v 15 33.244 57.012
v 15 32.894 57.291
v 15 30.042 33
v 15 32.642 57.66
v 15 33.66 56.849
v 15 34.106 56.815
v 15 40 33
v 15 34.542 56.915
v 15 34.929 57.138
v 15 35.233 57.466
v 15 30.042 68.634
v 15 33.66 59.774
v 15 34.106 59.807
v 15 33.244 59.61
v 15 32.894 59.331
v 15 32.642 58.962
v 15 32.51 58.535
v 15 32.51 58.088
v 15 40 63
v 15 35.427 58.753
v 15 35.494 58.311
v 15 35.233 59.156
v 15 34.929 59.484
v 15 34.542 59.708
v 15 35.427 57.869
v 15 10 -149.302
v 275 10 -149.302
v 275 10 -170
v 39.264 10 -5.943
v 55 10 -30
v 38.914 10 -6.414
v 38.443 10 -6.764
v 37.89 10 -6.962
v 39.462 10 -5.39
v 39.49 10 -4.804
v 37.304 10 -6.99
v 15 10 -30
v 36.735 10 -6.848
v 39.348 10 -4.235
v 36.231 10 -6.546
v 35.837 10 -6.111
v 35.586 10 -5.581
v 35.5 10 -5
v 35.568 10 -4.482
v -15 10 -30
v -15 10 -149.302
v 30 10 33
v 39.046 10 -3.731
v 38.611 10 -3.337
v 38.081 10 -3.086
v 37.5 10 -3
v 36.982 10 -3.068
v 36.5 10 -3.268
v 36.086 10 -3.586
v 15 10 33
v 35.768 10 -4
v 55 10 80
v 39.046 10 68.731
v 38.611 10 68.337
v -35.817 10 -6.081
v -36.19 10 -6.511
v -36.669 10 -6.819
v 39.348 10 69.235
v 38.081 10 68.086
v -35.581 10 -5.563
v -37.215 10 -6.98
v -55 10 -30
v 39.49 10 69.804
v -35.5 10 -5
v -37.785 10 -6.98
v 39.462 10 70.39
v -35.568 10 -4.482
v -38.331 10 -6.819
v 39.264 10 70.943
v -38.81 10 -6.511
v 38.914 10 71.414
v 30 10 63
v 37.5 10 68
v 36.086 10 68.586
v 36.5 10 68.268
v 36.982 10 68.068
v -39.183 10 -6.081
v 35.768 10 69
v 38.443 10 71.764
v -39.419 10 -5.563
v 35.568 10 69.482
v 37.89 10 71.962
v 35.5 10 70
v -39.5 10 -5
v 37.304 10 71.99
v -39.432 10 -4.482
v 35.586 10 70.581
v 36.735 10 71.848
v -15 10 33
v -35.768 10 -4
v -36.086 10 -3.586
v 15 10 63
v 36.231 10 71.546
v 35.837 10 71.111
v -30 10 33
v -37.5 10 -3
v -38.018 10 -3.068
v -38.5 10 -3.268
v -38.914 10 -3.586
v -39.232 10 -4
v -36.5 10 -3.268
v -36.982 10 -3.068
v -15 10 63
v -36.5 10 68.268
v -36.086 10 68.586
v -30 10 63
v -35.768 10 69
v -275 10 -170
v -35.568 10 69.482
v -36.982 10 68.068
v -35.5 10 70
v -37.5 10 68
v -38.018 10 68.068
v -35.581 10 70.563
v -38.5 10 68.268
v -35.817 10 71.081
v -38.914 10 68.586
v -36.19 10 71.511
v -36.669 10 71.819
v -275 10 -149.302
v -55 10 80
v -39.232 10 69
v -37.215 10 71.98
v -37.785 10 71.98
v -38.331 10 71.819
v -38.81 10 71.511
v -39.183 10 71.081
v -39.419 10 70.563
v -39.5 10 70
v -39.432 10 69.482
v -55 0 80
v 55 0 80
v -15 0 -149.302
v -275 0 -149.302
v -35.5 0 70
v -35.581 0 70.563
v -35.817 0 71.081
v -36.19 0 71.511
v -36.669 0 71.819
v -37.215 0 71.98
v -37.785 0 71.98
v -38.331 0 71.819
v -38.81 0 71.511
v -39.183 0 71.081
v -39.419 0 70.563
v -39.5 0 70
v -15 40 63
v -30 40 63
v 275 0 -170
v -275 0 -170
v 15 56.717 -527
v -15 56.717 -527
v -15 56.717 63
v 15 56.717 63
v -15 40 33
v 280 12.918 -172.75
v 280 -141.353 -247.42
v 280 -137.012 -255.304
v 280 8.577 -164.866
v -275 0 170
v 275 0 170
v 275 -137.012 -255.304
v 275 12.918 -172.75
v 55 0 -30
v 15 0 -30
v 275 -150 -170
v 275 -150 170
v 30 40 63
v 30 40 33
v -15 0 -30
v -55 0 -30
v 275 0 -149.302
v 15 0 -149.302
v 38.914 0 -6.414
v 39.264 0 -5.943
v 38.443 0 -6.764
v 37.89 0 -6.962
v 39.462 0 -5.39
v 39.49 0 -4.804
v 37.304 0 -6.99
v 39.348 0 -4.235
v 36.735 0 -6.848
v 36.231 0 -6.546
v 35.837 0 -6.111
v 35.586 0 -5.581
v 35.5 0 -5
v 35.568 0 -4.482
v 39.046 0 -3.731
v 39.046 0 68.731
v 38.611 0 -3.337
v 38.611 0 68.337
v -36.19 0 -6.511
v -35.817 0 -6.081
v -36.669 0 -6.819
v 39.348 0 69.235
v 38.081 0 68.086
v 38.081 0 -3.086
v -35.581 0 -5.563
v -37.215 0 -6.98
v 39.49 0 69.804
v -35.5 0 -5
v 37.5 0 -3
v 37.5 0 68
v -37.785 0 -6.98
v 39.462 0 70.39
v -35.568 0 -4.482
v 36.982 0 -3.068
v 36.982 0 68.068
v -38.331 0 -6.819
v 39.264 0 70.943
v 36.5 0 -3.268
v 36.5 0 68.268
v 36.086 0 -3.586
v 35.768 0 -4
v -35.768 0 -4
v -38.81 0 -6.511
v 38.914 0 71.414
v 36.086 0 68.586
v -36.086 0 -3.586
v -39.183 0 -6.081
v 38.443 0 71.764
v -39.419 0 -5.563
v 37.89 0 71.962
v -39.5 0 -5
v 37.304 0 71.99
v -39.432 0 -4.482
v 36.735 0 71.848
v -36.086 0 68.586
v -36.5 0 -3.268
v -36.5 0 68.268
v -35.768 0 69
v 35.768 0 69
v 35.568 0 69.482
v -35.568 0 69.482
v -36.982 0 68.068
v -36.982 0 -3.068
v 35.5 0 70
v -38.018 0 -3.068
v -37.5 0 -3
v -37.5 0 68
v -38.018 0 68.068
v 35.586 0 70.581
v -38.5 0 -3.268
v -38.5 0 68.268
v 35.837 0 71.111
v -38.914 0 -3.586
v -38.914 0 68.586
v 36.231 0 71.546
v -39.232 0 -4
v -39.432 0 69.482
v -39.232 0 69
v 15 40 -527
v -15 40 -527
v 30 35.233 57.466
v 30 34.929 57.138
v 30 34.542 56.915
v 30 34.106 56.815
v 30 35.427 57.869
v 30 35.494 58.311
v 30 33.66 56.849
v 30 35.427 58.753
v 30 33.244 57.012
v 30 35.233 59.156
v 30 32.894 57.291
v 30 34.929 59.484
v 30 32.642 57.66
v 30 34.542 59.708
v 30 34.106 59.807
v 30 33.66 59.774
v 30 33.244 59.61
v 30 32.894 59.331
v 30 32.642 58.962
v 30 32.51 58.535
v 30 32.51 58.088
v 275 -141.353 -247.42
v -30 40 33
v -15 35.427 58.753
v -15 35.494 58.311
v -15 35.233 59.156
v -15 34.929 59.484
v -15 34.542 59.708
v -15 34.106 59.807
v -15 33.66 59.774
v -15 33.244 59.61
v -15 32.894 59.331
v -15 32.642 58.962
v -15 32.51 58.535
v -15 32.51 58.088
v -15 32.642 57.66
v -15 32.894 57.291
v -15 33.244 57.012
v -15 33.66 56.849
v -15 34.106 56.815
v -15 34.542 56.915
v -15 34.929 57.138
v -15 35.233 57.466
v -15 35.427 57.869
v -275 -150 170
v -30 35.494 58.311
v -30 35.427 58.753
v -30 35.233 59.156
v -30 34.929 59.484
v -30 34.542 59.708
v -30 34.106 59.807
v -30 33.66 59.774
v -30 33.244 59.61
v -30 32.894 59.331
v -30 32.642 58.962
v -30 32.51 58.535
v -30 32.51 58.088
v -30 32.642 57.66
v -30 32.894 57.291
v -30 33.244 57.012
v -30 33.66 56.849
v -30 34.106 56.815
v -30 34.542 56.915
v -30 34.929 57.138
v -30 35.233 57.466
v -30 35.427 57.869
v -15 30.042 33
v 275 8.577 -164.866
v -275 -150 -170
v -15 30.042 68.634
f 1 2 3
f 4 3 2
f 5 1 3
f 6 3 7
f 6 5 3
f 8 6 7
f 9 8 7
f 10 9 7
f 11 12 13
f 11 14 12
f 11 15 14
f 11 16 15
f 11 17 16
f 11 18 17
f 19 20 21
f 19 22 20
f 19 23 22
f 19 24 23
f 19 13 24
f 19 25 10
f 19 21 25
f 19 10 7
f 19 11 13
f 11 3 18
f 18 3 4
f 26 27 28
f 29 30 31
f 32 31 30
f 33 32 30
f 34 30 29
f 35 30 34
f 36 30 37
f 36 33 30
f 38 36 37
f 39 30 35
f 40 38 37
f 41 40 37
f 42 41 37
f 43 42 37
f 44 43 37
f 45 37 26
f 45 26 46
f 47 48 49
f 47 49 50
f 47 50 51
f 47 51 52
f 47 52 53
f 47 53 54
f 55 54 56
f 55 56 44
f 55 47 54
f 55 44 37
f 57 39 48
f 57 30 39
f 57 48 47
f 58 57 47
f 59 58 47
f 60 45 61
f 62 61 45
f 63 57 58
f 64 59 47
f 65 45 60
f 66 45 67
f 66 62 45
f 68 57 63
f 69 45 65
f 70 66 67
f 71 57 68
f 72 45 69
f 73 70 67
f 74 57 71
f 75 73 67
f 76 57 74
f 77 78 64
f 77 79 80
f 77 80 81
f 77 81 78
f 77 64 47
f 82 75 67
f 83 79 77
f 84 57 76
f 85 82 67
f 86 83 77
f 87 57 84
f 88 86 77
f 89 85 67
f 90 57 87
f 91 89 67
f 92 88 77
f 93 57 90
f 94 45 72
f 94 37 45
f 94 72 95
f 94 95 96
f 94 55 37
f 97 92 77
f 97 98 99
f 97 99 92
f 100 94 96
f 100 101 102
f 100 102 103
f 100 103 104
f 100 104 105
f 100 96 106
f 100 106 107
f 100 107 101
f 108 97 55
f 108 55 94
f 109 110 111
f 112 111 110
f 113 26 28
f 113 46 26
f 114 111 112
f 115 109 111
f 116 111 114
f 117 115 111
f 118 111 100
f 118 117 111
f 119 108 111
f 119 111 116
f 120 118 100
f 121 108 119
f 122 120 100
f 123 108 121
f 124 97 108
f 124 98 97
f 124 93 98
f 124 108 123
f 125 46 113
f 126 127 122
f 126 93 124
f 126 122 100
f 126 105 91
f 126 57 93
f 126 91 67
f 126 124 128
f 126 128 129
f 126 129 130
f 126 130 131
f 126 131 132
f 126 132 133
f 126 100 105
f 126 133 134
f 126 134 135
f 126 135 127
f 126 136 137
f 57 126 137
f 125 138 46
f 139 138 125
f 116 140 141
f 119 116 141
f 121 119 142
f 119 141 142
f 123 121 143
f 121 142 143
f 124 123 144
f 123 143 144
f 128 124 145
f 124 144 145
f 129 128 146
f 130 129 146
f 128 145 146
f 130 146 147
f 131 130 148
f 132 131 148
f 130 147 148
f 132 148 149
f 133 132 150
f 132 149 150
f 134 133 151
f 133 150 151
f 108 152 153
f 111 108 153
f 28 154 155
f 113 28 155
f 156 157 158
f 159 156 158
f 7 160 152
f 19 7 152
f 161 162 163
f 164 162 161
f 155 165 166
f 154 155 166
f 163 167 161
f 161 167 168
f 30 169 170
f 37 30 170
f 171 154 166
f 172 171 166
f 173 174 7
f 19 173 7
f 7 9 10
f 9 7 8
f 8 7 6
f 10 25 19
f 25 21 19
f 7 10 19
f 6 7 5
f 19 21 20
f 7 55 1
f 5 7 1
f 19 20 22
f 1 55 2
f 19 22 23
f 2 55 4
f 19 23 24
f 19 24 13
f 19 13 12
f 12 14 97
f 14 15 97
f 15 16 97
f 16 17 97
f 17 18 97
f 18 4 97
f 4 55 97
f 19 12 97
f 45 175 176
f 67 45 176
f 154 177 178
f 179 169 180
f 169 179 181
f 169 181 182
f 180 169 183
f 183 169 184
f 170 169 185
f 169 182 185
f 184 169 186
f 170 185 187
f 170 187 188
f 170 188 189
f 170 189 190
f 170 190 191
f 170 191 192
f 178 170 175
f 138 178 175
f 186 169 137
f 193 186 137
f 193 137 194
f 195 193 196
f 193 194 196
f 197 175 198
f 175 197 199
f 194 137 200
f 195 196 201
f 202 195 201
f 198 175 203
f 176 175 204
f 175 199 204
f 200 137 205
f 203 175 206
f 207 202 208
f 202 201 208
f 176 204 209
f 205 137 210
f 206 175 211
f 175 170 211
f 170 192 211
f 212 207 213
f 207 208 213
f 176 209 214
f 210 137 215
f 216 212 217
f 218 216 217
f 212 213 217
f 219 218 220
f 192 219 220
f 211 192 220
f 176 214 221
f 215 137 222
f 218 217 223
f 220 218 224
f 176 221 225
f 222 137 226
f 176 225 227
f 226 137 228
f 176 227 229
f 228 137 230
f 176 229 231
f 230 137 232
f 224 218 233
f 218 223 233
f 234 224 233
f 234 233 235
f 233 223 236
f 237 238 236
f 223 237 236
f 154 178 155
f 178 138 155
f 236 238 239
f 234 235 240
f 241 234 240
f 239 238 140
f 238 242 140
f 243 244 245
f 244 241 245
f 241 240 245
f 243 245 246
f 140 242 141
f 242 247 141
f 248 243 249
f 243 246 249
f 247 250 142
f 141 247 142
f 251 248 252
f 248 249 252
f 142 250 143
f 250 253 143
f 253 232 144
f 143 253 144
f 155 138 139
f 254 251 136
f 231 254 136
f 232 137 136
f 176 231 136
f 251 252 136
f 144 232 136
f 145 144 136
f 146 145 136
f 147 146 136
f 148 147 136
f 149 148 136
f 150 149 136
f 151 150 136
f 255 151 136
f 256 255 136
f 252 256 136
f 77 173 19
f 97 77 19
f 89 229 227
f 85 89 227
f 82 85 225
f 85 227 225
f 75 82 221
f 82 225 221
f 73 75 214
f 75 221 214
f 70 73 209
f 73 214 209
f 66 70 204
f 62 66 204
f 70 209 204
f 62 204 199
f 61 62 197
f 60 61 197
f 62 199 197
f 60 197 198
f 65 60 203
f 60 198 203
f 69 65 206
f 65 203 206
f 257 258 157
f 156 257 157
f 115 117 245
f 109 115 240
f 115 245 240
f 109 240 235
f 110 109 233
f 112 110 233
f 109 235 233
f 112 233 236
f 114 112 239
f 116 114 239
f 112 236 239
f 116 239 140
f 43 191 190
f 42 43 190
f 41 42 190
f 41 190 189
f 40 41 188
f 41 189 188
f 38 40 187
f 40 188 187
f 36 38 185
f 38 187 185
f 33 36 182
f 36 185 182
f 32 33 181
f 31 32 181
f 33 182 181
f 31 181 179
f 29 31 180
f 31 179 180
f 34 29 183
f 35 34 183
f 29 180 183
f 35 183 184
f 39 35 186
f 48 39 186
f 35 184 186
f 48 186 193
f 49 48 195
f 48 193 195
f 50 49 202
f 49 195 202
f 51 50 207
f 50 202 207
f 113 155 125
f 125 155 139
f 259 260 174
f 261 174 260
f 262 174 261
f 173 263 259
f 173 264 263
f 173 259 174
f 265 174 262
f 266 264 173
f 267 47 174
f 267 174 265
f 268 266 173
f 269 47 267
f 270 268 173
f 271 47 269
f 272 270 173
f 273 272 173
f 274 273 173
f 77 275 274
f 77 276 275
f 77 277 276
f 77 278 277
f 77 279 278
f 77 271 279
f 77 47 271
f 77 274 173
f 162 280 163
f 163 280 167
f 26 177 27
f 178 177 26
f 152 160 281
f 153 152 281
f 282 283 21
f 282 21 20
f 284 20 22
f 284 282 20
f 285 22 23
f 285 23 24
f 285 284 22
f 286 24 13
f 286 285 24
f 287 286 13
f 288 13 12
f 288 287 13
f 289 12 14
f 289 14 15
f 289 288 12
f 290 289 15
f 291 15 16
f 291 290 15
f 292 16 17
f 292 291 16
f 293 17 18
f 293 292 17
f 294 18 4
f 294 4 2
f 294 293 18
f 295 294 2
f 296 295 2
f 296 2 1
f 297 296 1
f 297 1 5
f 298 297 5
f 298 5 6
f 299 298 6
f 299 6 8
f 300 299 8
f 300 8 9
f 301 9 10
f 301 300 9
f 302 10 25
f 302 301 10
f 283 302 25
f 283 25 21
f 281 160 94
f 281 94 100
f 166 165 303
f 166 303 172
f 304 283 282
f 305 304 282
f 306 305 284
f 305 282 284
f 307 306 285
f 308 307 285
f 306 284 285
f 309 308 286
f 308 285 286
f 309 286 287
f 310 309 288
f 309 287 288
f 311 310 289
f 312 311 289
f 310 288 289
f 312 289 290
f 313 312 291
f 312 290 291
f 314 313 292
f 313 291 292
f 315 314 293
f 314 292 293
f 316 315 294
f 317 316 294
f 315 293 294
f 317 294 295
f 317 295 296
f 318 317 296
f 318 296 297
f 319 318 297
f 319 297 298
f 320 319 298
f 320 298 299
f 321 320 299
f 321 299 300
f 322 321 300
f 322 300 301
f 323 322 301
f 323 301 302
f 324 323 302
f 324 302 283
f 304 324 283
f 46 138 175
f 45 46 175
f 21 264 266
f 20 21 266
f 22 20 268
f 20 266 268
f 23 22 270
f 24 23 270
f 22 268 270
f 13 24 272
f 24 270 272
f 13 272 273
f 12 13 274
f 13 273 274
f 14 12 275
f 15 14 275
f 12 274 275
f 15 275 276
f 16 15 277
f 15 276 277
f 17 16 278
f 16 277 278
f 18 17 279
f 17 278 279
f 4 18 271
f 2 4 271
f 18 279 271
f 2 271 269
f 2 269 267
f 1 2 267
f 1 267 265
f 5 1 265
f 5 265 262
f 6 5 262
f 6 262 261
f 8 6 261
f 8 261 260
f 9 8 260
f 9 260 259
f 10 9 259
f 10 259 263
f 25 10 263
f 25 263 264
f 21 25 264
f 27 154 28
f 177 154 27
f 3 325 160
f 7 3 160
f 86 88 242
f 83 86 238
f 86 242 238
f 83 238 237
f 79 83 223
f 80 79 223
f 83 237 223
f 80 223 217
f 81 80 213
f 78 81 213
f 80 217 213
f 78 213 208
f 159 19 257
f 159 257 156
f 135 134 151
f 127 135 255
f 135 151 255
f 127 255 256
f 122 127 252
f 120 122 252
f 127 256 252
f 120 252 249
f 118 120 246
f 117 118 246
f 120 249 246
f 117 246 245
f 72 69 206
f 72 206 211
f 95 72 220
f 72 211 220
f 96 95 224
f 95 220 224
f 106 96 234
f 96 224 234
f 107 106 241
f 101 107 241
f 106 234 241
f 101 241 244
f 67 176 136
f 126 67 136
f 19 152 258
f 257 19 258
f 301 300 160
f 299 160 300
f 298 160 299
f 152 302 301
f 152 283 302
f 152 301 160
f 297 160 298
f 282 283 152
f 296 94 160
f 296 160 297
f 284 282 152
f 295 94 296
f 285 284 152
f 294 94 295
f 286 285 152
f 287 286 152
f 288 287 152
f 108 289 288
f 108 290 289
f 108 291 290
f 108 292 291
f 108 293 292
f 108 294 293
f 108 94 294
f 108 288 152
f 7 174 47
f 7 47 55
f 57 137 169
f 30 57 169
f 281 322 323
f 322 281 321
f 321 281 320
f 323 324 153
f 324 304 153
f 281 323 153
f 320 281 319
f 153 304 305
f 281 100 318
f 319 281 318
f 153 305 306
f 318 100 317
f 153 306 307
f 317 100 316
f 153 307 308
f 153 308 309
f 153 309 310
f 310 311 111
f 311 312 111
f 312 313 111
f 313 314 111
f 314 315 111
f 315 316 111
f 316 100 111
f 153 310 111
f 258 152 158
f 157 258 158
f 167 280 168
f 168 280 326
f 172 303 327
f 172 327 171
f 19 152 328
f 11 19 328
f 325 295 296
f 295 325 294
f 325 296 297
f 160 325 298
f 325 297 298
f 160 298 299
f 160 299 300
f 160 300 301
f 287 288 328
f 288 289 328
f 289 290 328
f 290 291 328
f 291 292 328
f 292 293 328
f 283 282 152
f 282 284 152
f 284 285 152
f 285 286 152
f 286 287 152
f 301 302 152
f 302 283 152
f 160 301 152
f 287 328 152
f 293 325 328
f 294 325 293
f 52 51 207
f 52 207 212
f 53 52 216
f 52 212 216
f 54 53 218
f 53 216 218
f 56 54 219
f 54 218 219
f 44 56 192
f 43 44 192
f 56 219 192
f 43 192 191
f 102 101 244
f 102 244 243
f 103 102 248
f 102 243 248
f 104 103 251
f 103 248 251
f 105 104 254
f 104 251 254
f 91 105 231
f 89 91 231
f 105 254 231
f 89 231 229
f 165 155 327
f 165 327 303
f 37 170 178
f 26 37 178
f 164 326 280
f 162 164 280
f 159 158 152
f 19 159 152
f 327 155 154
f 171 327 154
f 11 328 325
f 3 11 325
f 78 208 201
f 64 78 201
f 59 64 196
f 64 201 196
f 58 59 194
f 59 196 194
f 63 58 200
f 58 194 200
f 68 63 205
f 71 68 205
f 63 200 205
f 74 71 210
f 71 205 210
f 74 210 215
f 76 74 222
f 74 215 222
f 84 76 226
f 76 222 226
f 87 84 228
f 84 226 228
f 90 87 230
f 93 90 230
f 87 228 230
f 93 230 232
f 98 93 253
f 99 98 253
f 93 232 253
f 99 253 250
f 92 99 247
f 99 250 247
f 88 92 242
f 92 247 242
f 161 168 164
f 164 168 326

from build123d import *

# Parameters (mm, degrees)
F0_W      = 550
F0_H      = 340
F1_DEPTH  = 150
F2_W      = 260
F2_H      = 20.6977409124
F2_W_2    = 15
F2_H_2    = 30
F3_DEPTH  = 10
F4_DEPTH  = 40
F5_R      = 1.5
F6_DEPTH  = 305.001
F7_W      = 9.9583332986
F7_H      = 30
F7_R      = 1.5
F8_DEPTH  = 30
F9_DEPTH  = 30
F11_DEPTH = 5


with BuildPart() as f1:
    # F0 (on Front) → F1 (new body)
    with BuildSketch(Plane.XZ):
        Rectangle(F0_W, F0_H)
    extrude(amount=F1_DEPTH)


with BuildPart() as f3:
    # F2 (on face) → F3 (new body)
    with BuildSketch(Plane(origin=(0, 0, 0), x_dir=(-1, 0, 0), z_dir=(0, 1, 0))):
        Polygon((55, 80), (-55, 80), (-55, -30), (-15, -30), (15, -30), (55, -30), align=None)
        with BuildLine():
            ThreePointArc((-37.5, 68), (-38.9142135624, 71.4142135624), (-35.5, 70))
            Line((-35.5, 70), (35.5, 70))
            ThreePointArc((35.5, 70), (37.5, 72), (39.5, 70))
            ThreePointArc((39.5, 70), (38.9142135624, 68.5857864376), (37.5, 68))
            Line((37.5, 68), (37.5, -3))
            ThreePointArc((37.5, -3), (38.9142135624, -3.5857864376), (39.5, -5))
            ThreePointArc((39.5, -5), (37.5, -7), (35.5, -5))
            Line((35.5, -5), (-35.5, -5))
            ThreePointArc((-35.5, -5), (-38.9142135624, -6.4142135624), (-37.5, -3))
            Line((-37.5, -3), (-37.5, 68))
        make_face(mode=Mode.SUBTRACT)
        Polygon((15, -30), (-15, -30), (-15, -149.3022590876), (-15, -170), (15, -170), (15, -149.3022590876), align=None)
        with Locations((-145, -159.6511295438)):
            Rectangle(F2_W, F2_H)
        with Locations((145, -159.6511295438)):
            Rectangle(F2_W, F2_H)
        with BuildLine():
            Line((35.5, 70), (-35.5, 70))
            ThreePointArc((-35.5, 70), (-36.0857864376, 68.5857864376), (-37.5, 68))
            Line((-37.5, 68), (-37.5, -3))
            ThreePointArc((-37.5, -3), (-36.0857864376, -3.5857864376), (-35.5, -5))
            Line((-35.5, -5), (35.5, -5))
            ThreePointArc((35.5, -5), (36.0857864376, -3.5857864376), (37.5, -3))
            Line((37.5, -3), (37.5, 68))
            ThreePointArc((37.5, 68), (36.0857864376, 68.5857864376), (35.5, 70))
        make_face()
        with Locations((-22.5, 48)):
            Rectangle(F2_W_2, F2_H_2, mode=Mode.SUBTRACT)
        with Locations((22.5, 48)):
            Rectangle(F2_W_2, F2_H_2, mode=Mode.SUBTRACT)
    extrude(amount=F3_DEPTH)

    # F2 (on face) → F4 (join)
    with BuildSketch(Plane(origin=(0, 0, 0), x_dir=(-1, 0, 0), z_dir=(0, 1, 0))):
        with Locations((-22.5, 48)):
            Rectangle(F2_W_2, F2_H_2)
        with Locations((22.5, 48)):
            Rectangle(F2_W_2, F2_H_2)
    extrude(amount=F4_DEPTH)

    # F5 (on face) → F6 (cut, through all)
    with BuildSketch(Plane.YZ.offset(30)):
        with Locations((33.9936188607, 58.3112341833)):
            Circle(F5_R)
    extrude(amount=-F6_DEPTH, mode=Mode.SUBTRACT)


with BuildPart() as f8:
    # F7 (on face) → F8 (new body)
    with BuildSketch(Plane.YZ.offset(-15)):
        with Locations((35.0208333507, 48)):
            Rectangle(F7_W, F7_H)
        with Locations((33.9936188607, 58.3112341833)):
            Circle(F7_R, mode=Mode.SUBTRACT)
        Polygon((30.0416667014, 68.6337277293), (30.0416667014, 63), (40, 63), align=None)
    extrude(amount=F8_DEPTH)


with BuildPart() as f9:
    # F7 (on face) → F9 (new body)
    with BuildSketch(Plane.YZ.offset(-15)):
        Polygon((56.7165538669, 63), (40, 63), (40, 33), (40, -527), (56.7165538669, -527), align=None)
    extrude(amount=F9_DEPTH)


with BuildPart() as f11:
    # F10 (on face) → F11 (new body)
    with BuildSketch(Plane.YZ.offset(275)):
        Polygon((12.9180778541, -172.7500329115), (8.5770755956, -164.8661443156), (-141.3527813543, -247.4200566054), (-137.0117790958, -255.3039452012), align=None)
    extrude(amount=F11_DEPTH)


solid = Compound([f1.part, f3.part, f8.part, f9.part, f11.part])
